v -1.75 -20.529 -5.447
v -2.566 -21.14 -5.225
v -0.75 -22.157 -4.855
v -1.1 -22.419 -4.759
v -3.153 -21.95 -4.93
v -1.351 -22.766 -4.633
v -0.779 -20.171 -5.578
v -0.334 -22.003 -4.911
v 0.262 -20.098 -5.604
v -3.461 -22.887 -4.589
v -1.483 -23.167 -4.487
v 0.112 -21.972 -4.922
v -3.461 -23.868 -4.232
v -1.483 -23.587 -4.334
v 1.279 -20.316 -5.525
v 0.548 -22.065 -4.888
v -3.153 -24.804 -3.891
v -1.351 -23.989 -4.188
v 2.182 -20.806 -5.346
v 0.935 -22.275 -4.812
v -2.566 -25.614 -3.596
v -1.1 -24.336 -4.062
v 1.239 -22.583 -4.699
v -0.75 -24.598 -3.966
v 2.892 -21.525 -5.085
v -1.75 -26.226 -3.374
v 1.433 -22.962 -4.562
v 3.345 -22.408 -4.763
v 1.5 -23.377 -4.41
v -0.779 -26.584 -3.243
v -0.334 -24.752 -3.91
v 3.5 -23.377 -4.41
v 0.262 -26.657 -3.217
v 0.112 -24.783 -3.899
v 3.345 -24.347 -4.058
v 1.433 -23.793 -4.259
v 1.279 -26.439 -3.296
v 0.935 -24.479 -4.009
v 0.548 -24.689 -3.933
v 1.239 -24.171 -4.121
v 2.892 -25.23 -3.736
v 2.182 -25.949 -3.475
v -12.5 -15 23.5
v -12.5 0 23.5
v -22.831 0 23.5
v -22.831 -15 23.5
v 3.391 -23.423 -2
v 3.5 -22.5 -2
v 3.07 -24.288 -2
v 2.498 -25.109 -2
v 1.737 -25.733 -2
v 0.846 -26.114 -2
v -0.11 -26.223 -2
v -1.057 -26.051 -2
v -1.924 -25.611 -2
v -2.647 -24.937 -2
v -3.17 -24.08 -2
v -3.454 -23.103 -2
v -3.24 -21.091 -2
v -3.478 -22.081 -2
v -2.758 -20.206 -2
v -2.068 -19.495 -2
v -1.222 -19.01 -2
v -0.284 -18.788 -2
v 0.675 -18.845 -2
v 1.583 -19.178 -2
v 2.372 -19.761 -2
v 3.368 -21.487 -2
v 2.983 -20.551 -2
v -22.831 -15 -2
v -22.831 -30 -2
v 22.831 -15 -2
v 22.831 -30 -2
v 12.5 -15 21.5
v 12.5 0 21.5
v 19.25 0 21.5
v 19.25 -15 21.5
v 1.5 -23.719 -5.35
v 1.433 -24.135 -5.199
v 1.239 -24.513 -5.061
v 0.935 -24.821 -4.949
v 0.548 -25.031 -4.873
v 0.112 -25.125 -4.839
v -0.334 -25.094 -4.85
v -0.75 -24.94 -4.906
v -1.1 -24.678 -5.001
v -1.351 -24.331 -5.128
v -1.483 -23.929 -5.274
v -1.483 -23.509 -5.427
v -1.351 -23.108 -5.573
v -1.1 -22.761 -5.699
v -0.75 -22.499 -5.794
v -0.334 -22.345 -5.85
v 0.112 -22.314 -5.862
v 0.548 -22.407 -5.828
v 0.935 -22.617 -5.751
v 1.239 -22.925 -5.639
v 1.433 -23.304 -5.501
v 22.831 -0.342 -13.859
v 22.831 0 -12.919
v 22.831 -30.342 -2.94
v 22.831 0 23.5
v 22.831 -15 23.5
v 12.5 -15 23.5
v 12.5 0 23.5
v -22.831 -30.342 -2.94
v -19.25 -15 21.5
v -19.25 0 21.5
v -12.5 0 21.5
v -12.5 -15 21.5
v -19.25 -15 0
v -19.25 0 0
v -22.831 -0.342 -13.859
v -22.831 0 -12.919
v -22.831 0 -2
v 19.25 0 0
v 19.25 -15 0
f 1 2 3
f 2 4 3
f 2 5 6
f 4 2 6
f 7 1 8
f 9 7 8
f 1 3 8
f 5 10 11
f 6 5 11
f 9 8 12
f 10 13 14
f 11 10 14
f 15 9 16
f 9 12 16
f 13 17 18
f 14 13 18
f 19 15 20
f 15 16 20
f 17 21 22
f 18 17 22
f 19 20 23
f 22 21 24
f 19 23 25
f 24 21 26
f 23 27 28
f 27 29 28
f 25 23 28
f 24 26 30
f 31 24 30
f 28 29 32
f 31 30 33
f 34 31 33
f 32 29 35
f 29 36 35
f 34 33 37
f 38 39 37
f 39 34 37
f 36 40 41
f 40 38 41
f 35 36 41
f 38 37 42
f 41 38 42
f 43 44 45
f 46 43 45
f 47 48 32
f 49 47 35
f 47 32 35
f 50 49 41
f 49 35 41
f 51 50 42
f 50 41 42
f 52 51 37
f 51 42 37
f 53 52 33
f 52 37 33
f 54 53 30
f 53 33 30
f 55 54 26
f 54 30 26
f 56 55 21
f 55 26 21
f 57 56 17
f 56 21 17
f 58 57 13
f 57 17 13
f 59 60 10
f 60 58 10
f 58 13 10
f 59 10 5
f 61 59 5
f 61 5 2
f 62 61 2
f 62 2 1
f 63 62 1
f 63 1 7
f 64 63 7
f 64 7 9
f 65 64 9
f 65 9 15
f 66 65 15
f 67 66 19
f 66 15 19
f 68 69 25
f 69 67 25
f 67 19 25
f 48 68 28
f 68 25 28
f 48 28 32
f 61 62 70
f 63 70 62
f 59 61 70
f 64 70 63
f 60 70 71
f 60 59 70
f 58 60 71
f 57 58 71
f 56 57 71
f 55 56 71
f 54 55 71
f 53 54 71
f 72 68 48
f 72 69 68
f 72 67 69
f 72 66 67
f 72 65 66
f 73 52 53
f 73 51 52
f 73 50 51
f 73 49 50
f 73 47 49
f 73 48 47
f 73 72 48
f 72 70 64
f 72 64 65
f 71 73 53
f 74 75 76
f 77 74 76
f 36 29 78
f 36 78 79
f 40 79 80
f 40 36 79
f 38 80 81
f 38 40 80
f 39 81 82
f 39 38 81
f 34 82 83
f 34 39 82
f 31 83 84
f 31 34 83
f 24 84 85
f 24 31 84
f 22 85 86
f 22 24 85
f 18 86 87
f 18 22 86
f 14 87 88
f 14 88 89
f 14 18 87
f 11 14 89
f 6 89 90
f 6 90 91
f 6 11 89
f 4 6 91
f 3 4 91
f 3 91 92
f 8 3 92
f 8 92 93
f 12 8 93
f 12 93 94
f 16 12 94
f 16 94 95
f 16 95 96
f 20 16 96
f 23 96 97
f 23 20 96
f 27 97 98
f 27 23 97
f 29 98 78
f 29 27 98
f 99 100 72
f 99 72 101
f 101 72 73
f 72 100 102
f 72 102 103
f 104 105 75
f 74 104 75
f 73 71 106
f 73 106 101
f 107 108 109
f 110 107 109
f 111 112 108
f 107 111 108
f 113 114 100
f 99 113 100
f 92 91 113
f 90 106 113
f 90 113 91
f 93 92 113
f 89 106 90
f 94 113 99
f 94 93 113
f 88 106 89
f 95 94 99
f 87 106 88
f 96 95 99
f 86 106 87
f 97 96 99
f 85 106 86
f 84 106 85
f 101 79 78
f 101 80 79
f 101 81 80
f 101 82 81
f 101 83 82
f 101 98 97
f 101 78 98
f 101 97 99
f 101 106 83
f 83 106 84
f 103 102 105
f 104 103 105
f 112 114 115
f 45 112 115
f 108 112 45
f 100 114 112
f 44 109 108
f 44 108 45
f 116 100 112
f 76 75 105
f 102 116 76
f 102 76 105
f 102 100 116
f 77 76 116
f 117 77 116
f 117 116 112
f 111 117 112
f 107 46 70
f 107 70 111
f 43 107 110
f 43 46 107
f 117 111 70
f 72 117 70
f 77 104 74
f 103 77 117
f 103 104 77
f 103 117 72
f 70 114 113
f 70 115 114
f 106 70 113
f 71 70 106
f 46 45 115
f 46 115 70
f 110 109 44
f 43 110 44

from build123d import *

# Parameters (mm, degrees)
F1_DEPTH = 15
F3_DEPTH = 45.6627906977
F4_R     = 3.5
F5_DEPTH = 3.8400468949
F6_W     = 45.6627906977
F6_H     = 31.9253331743
F6_R     = 3.5
F6_R_2   = 1.5
F7_DEPTH = 1


with BuildPart() as f1:
    # F0 (on Front) → F1 (new body)
    with BuildSketch(Plane.XZ):
        Polygon((19.25, 0), (-19.25, 0), (-19.25, 21.5), (-12.5, 21.5), (-12.5, 23.5), (-22.8313953488, 23.5), (-22.8313953488, -2), (22.8313953488, -2), (22.8313953488, 23.5), (12.5, 23.5), (12.5, 21.5), (19.25, 21.5), align=None)
    extrude(amount=F1_DEPTH)

    # F2 (on face) → F3 (join, through all)
    with BuildSketch(Plane.YZ.offset(22.8313953488)):
        Polygon((0, -2), (-30, -2), (0, -12.919107028), align=None)
    extrude(amount=-F3_DEPTH)

    # F4 (on face) → F5 (cut, through all)
    with BuildSketch(Plane(origin=(0, -4.1521209629, -11.4078585884), x_dir=(1, 0, 0), z_dir=(0, -0.3420201433, -0.9396926208))):
        with Locations((0, 20.459043681)):
            Circle(F4_R)
    extrude(amount=-F5_DEPTH, mode=Mode.SUBTRACT)

    # F6 (on face) → F7 (join)
    with BuildSketch(Plane(origin=(0, -4.1521209629, -11.4078585884), x_dir=(1, 0, 0), z_dir=(0, -0.3420201433, -0.9396926208))):
        with Locations((0, 11.5440717498)):
            Rectangle(F6_W, F6_H)
        with Locations((0, 20.459043681)):
            Circle(F6_R, mode=Mode.SUBTRACT)
        with Locations((0, 20.459043681)):
            Circle(F6_R)
        with Locations((0, 20.459043681)):
            Circle(F6_R_2, mode=Mode.SUBTRACT)
    extrude(amount=F7_DEPTH)


solid = f1.part
